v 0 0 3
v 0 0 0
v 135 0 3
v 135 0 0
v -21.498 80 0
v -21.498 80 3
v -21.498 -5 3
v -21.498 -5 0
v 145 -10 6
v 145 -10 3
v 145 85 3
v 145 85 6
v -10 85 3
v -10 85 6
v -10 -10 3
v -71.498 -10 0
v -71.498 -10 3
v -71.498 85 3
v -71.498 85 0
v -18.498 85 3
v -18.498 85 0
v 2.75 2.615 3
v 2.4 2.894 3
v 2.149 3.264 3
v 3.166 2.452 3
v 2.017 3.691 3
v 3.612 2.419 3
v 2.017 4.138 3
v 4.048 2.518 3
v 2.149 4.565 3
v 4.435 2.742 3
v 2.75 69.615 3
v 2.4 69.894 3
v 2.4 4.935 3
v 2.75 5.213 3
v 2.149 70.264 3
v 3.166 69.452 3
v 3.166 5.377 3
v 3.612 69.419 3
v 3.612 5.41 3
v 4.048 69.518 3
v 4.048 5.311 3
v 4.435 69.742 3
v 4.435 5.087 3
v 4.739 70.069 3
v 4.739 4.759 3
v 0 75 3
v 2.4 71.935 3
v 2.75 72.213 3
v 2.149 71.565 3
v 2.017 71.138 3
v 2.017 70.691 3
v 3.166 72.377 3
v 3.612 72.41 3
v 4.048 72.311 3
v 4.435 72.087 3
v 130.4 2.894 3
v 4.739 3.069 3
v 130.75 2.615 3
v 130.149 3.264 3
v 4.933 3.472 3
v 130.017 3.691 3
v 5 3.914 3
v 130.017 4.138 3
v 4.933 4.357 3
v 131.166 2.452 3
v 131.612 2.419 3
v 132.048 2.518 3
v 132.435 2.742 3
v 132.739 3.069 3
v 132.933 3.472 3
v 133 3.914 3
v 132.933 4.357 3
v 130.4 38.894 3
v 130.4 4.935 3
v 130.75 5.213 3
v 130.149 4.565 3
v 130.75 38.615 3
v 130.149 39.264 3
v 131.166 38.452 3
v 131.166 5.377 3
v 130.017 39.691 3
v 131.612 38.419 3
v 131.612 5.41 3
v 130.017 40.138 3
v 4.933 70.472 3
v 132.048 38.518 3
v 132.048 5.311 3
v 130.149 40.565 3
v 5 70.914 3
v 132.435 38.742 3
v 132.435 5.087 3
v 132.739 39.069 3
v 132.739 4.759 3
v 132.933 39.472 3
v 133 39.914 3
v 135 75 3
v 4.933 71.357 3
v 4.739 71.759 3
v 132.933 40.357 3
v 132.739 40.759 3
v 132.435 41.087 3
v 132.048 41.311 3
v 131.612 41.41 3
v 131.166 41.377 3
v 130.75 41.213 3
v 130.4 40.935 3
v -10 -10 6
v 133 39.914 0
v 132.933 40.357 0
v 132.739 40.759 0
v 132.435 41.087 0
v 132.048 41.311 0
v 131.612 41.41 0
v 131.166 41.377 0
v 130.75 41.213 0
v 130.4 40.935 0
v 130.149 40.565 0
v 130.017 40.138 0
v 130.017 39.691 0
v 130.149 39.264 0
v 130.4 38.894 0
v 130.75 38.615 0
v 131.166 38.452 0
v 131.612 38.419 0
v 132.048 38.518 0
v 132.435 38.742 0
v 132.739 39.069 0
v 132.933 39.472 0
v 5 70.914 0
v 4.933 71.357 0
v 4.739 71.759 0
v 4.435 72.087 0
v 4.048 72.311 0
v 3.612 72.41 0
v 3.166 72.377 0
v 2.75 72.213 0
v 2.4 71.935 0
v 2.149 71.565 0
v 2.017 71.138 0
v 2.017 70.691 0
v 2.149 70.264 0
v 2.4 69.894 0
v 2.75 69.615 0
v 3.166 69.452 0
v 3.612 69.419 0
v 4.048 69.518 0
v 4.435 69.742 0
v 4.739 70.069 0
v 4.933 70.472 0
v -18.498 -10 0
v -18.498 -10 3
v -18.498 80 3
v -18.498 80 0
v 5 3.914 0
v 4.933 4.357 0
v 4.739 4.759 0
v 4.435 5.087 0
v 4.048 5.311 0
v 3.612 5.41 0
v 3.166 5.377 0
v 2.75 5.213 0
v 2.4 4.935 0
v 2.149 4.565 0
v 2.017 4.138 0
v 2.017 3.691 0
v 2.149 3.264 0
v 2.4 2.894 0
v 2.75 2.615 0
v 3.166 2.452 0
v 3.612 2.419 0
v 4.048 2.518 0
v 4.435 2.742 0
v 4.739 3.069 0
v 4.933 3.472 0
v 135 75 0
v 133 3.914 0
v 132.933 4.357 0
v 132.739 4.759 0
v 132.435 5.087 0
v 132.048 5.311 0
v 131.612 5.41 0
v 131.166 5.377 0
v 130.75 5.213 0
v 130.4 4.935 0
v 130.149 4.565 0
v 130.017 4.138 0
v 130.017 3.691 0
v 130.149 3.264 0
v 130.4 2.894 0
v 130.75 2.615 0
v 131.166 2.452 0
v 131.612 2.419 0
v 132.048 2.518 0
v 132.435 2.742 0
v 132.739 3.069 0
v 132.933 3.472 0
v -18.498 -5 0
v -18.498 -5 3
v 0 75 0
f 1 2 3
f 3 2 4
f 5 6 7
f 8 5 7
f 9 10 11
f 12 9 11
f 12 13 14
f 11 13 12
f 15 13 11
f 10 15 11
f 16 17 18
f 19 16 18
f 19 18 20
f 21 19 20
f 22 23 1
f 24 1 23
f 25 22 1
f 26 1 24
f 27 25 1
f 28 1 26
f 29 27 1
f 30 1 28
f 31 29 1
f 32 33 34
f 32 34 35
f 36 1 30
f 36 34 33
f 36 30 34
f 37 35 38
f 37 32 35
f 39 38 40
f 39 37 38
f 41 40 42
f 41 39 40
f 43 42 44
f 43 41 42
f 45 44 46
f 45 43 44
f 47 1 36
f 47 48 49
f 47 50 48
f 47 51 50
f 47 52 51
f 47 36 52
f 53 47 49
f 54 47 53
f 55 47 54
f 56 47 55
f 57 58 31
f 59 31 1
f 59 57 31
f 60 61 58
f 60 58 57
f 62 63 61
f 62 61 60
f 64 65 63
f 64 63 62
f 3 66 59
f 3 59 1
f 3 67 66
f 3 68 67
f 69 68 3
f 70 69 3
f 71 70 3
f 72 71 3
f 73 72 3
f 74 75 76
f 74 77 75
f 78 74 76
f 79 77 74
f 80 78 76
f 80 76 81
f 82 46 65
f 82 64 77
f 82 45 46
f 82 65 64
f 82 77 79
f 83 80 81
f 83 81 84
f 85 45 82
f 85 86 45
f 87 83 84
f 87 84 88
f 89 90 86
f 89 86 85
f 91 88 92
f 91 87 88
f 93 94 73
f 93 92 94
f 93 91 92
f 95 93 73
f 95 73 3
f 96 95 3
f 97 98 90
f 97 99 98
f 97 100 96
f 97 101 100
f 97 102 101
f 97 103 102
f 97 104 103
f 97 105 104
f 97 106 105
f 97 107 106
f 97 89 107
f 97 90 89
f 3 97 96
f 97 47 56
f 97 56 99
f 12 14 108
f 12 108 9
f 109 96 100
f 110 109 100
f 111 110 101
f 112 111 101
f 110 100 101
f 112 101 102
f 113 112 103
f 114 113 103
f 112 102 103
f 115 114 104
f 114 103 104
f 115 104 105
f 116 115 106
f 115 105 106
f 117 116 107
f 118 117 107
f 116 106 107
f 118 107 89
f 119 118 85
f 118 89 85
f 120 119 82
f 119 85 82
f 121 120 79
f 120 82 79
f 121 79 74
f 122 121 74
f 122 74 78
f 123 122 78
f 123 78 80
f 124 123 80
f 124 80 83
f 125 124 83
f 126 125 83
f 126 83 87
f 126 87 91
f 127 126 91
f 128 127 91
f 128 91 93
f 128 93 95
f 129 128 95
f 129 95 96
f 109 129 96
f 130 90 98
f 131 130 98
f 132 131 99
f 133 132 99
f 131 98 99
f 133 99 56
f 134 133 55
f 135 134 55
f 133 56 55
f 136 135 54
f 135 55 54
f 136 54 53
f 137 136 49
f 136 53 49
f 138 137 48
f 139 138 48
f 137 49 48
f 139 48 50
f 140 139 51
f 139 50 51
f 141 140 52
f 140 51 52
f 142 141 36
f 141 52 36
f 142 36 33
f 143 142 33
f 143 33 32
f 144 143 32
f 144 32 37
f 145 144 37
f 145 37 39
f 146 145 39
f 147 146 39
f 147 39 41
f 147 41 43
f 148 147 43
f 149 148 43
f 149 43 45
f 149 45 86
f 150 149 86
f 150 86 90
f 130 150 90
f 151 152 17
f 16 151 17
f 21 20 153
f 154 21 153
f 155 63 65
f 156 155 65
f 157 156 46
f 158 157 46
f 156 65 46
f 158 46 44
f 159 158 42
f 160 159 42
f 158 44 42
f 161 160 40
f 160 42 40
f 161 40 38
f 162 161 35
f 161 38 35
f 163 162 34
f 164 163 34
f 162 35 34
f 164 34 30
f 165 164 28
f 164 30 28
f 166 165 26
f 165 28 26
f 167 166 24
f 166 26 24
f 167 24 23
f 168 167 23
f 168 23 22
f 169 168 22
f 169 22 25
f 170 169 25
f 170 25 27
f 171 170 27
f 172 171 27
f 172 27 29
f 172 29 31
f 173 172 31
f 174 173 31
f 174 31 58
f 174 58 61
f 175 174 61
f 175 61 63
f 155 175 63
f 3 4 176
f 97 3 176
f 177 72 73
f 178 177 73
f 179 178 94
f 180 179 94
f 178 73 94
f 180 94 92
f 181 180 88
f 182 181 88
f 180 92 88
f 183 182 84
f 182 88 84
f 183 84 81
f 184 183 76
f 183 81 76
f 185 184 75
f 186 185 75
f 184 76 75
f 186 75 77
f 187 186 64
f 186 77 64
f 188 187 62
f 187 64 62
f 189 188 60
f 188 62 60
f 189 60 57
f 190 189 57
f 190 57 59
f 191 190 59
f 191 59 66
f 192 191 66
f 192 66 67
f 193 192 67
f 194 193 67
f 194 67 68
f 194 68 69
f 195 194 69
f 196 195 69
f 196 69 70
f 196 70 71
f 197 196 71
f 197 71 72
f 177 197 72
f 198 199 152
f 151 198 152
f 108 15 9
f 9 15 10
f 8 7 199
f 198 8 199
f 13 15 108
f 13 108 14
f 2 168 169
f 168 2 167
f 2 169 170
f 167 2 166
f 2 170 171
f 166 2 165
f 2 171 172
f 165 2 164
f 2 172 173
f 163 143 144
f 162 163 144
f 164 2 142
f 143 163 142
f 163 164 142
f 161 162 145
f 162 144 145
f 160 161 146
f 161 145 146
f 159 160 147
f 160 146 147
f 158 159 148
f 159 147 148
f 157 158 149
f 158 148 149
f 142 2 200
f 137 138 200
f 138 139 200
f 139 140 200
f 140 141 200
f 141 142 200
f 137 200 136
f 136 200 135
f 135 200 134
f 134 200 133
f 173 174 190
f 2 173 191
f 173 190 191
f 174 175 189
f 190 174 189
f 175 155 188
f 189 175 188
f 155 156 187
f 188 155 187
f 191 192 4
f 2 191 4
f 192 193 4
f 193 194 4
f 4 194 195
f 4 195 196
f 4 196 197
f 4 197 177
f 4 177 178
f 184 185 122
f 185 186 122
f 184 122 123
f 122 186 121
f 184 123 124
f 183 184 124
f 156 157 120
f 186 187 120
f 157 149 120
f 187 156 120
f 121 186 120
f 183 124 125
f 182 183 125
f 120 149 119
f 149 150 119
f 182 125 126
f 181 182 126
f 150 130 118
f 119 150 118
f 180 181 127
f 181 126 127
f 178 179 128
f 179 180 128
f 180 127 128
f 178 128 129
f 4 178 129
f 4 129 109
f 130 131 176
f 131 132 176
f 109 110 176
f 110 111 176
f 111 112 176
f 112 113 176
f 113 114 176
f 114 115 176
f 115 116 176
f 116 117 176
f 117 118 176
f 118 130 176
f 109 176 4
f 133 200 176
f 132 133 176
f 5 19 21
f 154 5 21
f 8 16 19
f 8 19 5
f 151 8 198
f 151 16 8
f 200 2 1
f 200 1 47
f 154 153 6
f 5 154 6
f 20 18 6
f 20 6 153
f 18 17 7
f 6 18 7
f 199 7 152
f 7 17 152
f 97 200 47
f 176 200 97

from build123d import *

# Parameters (mm, degrees)
F0_W     = 135
F0_H     = 75
F1_DEPTH = 3
F2_R     = 1.5
F3_DEPTH = 25
F4_W     = 155
F4_H     = 95
F5_DEPTH = 3
F7_DEPTH = 3


with BuildPart() as f1:
    # F0 (on Top) → F1 (new body)
    with BuildSketch(Plane.XY):
        with Locations((67.5, 37.5)):
            Rectangle(F0_W, F0_H)
    extrude(amount=F1_DEPTH)

    # F2 (on face) → F3 (cut)
    with BuildSketch(Plane.XY.offset(3)):
        with Locations((3.5, 70.914406)):
            Circle(F2_R)
        with Locations((3.5, 3.914406)):
            Circle(F2_R)
        with Locations((131.5, 3.914406)):
            Circle(F2_R)
        with Locations((131.5, 39.914406)):
            Circle(F2_R)
    extrude(amount=-F3_DEPTH, mode=Mode.SUBTRACT)


with BuildPart() as f5:
    # F4 (on face) → F5 (new body)
    with BuildSketch(Plane.XY.offset(3)):
        with Locations((67.5, 37.5)):
            Rectangle(F4_W, F4_H)
    extrude(amount=F5_DEPTH)


with BuildPart() as f7:
    # F6 (on face) → F7 (new body)
    with BuildSketch(Plane(origin=(0, 0, 3), x_dir=(1, 0, 0), z_dir=(0, 0, -1))):
        Polygon((-18.498036, 10), (-21.498036, 10), (-71.498036, 10), (-71.498036, -85), (-21.498036, -85), (-18.498036, -85), (-18.498036, -80), (-21.498036, -80), (-21.498036, 5), (-18.498036, 5), align=None)
    extrude(amount=F7_DEPTH)


solid = Compound([f1.part, f5.part, f7.part])
